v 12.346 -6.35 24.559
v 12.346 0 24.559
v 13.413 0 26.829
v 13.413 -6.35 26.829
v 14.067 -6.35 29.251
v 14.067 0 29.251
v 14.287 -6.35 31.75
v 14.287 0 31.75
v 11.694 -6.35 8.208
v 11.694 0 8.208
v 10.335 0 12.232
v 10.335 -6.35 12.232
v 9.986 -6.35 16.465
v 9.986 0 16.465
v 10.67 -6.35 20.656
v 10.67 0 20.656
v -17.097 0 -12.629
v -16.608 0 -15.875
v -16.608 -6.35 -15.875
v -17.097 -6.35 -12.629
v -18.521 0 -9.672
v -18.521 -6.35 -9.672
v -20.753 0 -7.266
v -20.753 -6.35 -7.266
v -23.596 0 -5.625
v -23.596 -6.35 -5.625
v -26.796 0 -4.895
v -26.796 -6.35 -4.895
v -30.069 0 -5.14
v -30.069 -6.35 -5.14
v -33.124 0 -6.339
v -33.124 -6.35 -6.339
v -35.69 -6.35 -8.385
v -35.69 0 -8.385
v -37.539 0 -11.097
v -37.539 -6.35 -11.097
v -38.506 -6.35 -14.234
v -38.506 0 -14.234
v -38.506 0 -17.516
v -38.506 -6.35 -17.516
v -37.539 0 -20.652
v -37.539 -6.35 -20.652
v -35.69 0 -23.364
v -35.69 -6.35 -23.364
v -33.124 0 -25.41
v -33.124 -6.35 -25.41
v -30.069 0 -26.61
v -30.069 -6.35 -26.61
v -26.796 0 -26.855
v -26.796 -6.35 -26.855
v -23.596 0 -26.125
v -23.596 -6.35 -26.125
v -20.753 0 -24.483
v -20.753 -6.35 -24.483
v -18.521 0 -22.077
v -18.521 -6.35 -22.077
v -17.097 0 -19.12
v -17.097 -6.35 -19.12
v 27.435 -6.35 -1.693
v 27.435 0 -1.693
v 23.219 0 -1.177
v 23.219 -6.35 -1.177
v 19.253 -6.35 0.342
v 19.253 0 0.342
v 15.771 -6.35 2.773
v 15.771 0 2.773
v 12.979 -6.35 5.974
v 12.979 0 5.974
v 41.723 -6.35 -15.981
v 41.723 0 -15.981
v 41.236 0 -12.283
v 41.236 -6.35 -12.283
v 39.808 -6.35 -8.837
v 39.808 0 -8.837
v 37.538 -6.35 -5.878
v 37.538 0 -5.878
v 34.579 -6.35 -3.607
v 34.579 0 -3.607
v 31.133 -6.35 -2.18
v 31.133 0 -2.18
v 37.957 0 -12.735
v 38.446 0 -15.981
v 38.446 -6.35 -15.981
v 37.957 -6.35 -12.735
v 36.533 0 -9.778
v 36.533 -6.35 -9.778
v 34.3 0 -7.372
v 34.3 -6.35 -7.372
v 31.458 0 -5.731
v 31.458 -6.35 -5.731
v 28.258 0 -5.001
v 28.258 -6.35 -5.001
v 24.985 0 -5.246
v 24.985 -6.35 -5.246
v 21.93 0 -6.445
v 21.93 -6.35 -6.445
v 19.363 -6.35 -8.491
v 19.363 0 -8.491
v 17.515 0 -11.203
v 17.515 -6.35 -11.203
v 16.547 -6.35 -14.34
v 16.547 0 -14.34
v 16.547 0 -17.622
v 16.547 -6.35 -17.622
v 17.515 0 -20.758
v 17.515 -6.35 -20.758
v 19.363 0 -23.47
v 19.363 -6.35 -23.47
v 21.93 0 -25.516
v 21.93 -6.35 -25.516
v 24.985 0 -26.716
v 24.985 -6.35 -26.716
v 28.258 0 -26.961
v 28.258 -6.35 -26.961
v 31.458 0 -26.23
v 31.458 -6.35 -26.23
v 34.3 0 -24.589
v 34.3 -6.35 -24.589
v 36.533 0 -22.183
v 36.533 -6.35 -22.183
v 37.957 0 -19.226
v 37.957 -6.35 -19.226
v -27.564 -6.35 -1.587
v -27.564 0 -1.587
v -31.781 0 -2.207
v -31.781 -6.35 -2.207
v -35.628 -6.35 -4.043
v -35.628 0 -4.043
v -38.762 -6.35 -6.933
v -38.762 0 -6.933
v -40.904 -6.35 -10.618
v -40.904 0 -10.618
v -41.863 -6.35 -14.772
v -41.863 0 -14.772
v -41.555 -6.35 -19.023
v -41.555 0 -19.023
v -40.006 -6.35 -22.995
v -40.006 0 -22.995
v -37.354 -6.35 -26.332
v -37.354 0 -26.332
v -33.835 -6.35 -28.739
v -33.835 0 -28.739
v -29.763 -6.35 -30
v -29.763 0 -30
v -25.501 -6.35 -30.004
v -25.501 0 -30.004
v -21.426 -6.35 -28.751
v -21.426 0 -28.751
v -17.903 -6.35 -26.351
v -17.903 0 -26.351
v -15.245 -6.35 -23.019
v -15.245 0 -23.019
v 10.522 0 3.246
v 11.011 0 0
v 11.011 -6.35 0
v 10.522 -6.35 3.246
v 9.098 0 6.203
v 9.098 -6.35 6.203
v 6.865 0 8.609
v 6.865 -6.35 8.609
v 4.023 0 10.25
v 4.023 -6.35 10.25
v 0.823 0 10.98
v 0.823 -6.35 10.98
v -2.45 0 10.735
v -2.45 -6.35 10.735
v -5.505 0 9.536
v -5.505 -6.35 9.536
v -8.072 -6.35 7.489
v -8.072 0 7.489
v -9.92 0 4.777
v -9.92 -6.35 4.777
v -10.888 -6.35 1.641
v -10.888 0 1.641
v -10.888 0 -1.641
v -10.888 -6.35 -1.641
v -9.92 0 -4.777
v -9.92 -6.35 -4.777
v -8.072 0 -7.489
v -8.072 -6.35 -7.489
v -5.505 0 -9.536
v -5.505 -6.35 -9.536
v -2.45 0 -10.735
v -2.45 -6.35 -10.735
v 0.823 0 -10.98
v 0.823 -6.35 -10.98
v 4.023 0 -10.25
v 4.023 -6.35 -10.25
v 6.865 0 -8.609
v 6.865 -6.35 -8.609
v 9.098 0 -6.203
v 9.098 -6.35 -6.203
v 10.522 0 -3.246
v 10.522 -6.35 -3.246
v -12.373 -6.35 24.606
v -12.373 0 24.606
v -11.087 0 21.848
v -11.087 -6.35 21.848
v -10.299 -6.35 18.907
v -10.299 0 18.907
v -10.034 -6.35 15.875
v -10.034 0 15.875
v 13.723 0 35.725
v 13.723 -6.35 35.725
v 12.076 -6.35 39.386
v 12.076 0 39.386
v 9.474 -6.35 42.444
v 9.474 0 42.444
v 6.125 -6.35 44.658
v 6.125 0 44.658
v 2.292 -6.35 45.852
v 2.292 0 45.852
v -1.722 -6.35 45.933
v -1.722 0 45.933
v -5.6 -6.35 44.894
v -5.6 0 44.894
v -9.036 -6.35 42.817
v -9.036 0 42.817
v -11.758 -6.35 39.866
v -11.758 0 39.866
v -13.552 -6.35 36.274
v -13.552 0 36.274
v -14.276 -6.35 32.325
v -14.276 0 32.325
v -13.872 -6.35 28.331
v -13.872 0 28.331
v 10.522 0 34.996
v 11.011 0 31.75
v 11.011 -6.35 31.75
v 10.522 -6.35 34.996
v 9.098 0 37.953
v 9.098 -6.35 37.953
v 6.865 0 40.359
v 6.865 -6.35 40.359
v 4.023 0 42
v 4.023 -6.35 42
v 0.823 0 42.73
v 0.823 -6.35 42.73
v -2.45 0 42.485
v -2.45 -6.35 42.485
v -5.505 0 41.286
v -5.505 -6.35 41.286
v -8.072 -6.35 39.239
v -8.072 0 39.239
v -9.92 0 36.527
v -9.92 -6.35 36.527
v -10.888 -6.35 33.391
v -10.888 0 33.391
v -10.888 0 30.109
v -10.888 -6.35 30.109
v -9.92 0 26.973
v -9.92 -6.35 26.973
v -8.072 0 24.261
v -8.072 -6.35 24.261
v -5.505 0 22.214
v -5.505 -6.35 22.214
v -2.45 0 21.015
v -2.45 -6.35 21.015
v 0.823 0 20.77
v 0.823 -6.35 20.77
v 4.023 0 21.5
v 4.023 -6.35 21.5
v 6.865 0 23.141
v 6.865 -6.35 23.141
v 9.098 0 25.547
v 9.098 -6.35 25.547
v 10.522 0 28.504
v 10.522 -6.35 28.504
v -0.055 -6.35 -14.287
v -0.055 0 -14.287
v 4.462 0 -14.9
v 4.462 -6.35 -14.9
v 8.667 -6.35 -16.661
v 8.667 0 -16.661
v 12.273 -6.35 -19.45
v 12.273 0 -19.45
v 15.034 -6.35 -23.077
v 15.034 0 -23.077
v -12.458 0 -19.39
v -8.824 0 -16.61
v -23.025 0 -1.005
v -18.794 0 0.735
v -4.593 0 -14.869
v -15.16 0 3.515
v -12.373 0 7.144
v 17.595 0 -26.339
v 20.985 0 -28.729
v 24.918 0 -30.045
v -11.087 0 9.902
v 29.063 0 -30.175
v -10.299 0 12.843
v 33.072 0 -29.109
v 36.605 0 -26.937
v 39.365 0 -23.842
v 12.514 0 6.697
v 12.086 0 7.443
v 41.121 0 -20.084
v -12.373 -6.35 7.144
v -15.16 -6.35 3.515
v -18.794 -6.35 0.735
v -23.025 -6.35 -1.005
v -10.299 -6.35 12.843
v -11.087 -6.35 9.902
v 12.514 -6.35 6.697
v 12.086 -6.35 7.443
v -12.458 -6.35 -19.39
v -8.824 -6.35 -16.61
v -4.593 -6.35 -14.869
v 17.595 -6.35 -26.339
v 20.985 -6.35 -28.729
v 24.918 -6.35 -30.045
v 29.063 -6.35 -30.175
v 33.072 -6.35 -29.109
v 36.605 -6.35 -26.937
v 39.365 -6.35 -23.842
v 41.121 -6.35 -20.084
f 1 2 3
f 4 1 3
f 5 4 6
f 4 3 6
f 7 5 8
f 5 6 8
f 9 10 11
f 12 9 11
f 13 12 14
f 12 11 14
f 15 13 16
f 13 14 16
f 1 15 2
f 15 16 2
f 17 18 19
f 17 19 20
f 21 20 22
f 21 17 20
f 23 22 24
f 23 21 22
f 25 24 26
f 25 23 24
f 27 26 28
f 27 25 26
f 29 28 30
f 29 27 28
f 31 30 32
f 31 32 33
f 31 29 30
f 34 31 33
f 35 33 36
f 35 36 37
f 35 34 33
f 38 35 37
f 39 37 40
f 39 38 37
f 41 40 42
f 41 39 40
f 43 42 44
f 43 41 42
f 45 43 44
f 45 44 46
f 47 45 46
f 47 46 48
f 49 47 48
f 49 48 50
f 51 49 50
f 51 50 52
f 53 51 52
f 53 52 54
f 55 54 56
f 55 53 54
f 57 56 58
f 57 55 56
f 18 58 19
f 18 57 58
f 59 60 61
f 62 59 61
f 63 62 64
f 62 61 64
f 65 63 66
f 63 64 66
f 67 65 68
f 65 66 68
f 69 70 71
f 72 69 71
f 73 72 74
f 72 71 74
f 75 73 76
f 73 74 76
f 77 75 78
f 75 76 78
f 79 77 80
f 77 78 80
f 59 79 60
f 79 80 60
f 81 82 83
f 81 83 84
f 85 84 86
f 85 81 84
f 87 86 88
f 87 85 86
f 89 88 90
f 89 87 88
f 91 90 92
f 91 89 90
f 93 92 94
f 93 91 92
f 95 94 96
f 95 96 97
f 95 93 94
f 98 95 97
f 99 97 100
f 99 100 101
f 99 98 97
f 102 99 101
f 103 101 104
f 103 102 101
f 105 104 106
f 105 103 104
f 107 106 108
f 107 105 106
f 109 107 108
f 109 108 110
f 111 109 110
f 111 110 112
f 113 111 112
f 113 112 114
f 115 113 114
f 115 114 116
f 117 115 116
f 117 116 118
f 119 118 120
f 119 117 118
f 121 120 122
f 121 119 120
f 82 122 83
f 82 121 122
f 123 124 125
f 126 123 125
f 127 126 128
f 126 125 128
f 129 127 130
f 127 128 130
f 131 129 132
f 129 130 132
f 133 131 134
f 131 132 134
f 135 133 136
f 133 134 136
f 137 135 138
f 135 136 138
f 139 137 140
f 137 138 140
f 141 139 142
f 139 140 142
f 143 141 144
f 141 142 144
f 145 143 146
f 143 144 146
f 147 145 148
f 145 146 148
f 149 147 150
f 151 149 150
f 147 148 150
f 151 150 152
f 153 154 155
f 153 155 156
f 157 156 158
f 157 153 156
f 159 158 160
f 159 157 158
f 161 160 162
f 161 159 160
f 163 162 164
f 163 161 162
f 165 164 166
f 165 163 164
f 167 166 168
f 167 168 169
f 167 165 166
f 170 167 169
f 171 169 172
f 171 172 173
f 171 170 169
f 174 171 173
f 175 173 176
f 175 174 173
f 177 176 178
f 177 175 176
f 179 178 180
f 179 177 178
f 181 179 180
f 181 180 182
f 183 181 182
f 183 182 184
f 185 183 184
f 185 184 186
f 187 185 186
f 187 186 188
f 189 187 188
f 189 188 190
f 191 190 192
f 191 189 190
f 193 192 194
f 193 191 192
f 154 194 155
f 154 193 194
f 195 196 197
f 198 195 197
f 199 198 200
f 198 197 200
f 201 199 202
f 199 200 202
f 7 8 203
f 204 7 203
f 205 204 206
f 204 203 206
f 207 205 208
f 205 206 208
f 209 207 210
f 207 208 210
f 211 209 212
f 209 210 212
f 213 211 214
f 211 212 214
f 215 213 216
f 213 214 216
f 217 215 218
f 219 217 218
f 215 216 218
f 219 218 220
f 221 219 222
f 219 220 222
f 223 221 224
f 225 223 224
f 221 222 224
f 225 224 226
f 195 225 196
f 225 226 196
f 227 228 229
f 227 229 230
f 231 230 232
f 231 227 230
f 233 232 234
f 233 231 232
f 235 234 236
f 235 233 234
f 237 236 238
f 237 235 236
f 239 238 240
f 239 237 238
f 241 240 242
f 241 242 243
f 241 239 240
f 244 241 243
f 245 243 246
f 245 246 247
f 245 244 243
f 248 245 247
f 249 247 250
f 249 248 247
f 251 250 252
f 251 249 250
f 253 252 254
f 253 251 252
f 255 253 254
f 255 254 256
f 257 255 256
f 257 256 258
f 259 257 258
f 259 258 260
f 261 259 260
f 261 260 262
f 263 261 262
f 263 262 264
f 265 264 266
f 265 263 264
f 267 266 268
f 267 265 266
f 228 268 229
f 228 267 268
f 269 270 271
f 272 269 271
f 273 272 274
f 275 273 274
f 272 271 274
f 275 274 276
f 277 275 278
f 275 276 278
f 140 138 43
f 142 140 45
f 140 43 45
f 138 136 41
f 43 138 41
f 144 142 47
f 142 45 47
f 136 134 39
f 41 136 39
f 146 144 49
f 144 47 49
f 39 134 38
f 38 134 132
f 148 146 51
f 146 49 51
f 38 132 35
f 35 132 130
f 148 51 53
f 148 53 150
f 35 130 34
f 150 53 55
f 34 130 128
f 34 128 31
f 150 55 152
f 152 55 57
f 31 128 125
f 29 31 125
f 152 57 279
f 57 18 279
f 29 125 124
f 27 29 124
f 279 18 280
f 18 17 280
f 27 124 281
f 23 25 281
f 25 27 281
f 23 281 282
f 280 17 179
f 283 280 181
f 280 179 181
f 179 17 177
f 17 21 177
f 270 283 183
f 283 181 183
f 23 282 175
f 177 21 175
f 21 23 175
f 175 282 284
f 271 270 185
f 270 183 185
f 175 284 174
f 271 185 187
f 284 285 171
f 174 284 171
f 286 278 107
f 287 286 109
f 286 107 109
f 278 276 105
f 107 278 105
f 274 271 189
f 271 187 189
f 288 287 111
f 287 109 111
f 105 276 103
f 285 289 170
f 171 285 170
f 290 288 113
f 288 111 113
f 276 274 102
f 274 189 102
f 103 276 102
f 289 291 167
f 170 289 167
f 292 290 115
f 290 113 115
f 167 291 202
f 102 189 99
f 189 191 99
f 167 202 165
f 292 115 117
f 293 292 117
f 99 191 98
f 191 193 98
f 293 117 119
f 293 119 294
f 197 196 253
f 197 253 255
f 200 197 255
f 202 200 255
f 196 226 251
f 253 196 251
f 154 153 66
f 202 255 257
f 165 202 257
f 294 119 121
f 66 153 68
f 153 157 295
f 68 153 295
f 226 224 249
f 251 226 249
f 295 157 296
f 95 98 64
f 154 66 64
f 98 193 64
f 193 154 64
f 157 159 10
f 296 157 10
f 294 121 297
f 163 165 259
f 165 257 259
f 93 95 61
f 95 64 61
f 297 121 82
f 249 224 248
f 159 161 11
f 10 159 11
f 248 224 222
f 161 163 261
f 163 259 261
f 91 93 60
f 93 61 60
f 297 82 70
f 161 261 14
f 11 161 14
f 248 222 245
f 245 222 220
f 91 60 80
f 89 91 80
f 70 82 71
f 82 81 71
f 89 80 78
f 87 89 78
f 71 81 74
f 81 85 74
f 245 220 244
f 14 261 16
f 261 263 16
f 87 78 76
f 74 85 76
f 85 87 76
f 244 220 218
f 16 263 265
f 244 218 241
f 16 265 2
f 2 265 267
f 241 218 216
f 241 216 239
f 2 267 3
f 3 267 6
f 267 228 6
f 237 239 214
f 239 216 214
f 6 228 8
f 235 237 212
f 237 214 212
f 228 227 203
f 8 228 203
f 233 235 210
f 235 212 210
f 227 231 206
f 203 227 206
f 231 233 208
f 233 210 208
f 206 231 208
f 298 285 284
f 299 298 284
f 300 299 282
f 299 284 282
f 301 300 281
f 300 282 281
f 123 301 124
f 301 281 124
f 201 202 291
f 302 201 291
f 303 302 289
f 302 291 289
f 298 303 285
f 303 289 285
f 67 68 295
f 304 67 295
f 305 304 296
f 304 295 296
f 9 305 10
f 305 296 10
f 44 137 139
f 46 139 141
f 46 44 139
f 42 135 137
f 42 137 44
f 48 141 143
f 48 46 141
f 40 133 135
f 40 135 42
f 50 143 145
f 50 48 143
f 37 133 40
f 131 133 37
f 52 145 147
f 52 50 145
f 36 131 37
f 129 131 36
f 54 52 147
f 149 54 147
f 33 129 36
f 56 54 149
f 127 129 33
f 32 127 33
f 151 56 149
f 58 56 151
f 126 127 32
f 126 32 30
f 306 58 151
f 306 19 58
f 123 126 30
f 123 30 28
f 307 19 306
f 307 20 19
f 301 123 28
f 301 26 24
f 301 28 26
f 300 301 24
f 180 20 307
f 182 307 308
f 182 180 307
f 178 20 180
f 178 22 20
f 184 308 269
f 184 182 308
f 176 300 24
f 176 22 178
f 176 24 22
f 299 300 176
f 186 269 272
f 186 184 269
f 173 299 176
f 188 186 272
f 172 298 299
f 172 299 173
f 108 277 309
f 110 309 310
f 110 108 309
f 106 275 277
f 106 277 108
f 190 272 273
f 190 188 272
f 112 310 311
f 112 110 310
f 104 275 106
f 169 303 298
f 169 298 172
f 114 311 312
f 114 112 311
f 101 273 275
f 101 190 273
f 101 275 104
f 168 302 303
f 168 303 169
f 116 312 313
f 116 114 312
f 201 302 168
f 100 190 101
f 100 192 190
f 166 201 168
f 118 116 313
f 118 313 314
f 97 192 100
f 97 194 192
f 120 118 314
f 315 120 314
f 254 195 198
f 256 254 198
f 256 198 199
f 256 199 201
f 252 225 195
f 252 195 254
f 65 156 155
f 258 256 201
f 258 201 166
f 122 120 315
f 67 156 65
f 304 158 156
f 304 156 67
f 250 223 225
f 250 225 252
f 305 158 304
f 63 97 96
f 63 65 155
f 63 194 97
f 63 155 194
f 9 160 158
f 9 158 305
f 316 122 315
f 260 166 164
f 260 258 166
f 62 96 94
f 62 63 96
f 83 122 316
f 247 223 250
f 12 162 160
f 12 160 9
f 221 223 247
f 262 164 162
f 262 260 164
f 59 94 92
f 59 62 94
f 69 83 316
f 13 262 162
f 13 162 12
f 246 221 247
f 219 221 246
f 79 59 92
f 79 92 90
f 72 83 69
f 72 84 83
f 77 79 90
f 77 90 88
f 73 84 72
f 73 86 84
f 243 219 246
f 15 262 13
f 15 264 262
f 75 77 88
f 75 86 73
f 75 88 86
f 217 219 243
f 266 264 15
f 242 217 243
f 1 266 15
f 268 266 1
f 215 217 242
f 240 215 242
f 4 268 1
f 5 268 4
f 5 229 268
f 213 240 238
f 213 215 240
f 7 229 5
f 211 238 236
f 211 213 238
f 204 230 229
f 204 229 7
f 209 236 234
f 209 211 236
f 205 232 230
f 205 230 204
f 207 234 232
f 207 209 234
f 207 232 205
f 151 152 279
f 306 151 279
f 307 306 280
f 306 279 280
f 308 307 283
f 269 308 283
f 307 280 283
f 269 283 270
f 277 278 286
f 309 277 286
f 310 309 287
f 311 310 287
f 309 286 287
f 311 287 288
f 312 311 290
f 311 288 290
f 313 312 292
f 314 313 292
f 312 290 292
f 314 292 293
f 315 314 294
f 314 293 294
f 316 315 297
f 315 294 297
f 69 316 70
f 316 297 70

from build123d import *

# Parameters (mm, degrees)
F0_R     = 11.0109
F1_DEPTH = 6.35


with BuildPart() as f1:
    # F0 (on Front) → F1 (new body)
    with BuildSketch(Plane.XZ):
        with BuildLine():
            ThreePointArc((-12.3733379796, 24.6062500399), (-0.0274921787, 17.4625264504), (12.3457542252, 24.5586851785))
            ThreePointArc((12.3457542252, 24.5586851785), (13.7935242005, 28.0255743558), (14.2875, 31.75))
            ThreePointArc((14.2875, 31.75), (-3.6978770846, 45.5506652491), (-12.3733379796, 24.6062500399))
        make_face()
        with Locations((0, 31.75)):
            Circle(F0_R, mode=Mode.SUBTRACT)
        with BuildLine():
            ThreePointArc((-12.3733379176, 7.1437500675), (-0.6313413892, 14.2735442095), (11.6942925407, 8.2082993502))
            ThreePointArc((11.6942925407, 8.2082993502), (9.9863540663, 16.4645214005), (12.3457542252, 24.5586851785))
            ThreePointArc((12.3457542252, 24.5586851785), (-0.0274921787, 17.4625264504), (-12.3733379796, 24.6062500399))
            ThreePointArc((-12.3733379796, 24.6062500399), (-10.6288268346, 20.3946275974), (-10.0338065702, 15.875))
            ThreePointArc((-10.0338065702, 15.875), (-10.6288268185, 11.3553724626), (-12.3733379176, 7.1437500675))
        make_face()
        with BuildLine():
            ThreePointArc((-0.0549843517, -14.2873941981), (10.0833294929, -10.1222093728), (14.2875, 0))
            ThreePointArc((14.2875, 0), (13.9564974416, 3.057586534), (12.9788266264, 5.9735011218))
            ThreePointArc((12.9788266264, 5.9735011218), (12.2952680668, 7.0671663883), (11.6942925407, 8.2082993502))
            ThreePointArc((11.6942925407, 8.2082993502), (-0.6313413892, 14.2735442095), (-12.3733379176, 7.1437500675))
            ThreePointArc((-12.3733379176, 7.1437500675), (-12.3870611826, -7.1199277742), (-0.0549843517, -14.2873941981))
        make_face()
        Circle(F0_R, mode=Mode.SUBTRACT)
        with BuildLine():
            ThreePointArc((-15.2451557121, -23.0185149788), (-8.8243212537, -16.6100235917), (-0.0549843517, -14.2873941981))
            ThreePointArc((-0.0549843517, -14.2873941981), (-12.3870611826, -7.1199277742), (-12.3733379176, 7.1437500675))
            ThreePointArc((-12.3733379176, 7.1437500675), (-18.7941724786, 0.7352586382), (-27.5635095047, -1.5873706872))
            ThreePointArc((-27.5635095047, -1.5873706872), (-17.4962843274, -5.7914353078), (-13.3309936151, -15.8747648862))
            ThreePointArc((-13.3309936151, -15.8747648862), (-13.8178283859, -19.5726420447), (-15.2451557121, -23.0185149788))
        make_face()
        with BuildLine():
            ThreePointArc((-27.5635095047, -1.5873706872), (-40.0055547448, -22.9946927523), (-15.2451557121, -23.0185149788))
            ThreePointArc((-15.2451557121, -23.0185149788), (-13.8178283859, -19.5726420447), (-13.3309936151, -15.8747648862))
            ThreePointArc((-13.3309936151, -15.8747648862), (-17.4962843274, -5.7914353078), (-27.5635095047, -1.5873706872))
        make_face()
        with Locations((-27.6184936151, -15.8747648862)):
            Circle(F0_R, mode=Mode.SUBTRACT)
        with BuildLine():
            ThreePointArc((12.9788266264, 5.9735011218), (13.9564974416, 3.057586534), (14.2875, 0))
            ThreePointArc((14.2875, 0), (10.0833294929, -10.1222093728), (-0.0549843517, -14.2873941981))
            ThreePointArc((-0.0549843517, -14.2873941981), (8.6671977023, -16.6605097019), (15.034271116, -23.0767791104))
            ThreePointArc((15.034271116, -23.0767791104), (15.0754403986, -8.8131539558), (27.4350094206, -1.693199528))
            ThreePointArc((27.4350094206, -1.693199528), (19.2533298904, 0.3420834154), (12.9788266264, 5.9735011218))
        make_face()
        with BuildLine():
            ThreePointArc((41.7225094331, -15.980699528), (37.5377975649, -5.8779113874), (27.4350094206, -1.693199528))
            ThreePointArc((27.4350094206, -1.693199528), (15.0754403986, -8.8131539558), (15.034271116, -23.0767791104))
            ThreePointArc((15.034271116, -23.0767791104), (31.1063244253, -29.7884546851), (41.7225094331, -15.980699528))
        make_face()
        with Locations((27.4350094331, -15.980699528)):
            Circle(F0_R, mode=Mode.SUBTRACT)
    extrude(amount=F1_DEPTH)


solid = f1.part
